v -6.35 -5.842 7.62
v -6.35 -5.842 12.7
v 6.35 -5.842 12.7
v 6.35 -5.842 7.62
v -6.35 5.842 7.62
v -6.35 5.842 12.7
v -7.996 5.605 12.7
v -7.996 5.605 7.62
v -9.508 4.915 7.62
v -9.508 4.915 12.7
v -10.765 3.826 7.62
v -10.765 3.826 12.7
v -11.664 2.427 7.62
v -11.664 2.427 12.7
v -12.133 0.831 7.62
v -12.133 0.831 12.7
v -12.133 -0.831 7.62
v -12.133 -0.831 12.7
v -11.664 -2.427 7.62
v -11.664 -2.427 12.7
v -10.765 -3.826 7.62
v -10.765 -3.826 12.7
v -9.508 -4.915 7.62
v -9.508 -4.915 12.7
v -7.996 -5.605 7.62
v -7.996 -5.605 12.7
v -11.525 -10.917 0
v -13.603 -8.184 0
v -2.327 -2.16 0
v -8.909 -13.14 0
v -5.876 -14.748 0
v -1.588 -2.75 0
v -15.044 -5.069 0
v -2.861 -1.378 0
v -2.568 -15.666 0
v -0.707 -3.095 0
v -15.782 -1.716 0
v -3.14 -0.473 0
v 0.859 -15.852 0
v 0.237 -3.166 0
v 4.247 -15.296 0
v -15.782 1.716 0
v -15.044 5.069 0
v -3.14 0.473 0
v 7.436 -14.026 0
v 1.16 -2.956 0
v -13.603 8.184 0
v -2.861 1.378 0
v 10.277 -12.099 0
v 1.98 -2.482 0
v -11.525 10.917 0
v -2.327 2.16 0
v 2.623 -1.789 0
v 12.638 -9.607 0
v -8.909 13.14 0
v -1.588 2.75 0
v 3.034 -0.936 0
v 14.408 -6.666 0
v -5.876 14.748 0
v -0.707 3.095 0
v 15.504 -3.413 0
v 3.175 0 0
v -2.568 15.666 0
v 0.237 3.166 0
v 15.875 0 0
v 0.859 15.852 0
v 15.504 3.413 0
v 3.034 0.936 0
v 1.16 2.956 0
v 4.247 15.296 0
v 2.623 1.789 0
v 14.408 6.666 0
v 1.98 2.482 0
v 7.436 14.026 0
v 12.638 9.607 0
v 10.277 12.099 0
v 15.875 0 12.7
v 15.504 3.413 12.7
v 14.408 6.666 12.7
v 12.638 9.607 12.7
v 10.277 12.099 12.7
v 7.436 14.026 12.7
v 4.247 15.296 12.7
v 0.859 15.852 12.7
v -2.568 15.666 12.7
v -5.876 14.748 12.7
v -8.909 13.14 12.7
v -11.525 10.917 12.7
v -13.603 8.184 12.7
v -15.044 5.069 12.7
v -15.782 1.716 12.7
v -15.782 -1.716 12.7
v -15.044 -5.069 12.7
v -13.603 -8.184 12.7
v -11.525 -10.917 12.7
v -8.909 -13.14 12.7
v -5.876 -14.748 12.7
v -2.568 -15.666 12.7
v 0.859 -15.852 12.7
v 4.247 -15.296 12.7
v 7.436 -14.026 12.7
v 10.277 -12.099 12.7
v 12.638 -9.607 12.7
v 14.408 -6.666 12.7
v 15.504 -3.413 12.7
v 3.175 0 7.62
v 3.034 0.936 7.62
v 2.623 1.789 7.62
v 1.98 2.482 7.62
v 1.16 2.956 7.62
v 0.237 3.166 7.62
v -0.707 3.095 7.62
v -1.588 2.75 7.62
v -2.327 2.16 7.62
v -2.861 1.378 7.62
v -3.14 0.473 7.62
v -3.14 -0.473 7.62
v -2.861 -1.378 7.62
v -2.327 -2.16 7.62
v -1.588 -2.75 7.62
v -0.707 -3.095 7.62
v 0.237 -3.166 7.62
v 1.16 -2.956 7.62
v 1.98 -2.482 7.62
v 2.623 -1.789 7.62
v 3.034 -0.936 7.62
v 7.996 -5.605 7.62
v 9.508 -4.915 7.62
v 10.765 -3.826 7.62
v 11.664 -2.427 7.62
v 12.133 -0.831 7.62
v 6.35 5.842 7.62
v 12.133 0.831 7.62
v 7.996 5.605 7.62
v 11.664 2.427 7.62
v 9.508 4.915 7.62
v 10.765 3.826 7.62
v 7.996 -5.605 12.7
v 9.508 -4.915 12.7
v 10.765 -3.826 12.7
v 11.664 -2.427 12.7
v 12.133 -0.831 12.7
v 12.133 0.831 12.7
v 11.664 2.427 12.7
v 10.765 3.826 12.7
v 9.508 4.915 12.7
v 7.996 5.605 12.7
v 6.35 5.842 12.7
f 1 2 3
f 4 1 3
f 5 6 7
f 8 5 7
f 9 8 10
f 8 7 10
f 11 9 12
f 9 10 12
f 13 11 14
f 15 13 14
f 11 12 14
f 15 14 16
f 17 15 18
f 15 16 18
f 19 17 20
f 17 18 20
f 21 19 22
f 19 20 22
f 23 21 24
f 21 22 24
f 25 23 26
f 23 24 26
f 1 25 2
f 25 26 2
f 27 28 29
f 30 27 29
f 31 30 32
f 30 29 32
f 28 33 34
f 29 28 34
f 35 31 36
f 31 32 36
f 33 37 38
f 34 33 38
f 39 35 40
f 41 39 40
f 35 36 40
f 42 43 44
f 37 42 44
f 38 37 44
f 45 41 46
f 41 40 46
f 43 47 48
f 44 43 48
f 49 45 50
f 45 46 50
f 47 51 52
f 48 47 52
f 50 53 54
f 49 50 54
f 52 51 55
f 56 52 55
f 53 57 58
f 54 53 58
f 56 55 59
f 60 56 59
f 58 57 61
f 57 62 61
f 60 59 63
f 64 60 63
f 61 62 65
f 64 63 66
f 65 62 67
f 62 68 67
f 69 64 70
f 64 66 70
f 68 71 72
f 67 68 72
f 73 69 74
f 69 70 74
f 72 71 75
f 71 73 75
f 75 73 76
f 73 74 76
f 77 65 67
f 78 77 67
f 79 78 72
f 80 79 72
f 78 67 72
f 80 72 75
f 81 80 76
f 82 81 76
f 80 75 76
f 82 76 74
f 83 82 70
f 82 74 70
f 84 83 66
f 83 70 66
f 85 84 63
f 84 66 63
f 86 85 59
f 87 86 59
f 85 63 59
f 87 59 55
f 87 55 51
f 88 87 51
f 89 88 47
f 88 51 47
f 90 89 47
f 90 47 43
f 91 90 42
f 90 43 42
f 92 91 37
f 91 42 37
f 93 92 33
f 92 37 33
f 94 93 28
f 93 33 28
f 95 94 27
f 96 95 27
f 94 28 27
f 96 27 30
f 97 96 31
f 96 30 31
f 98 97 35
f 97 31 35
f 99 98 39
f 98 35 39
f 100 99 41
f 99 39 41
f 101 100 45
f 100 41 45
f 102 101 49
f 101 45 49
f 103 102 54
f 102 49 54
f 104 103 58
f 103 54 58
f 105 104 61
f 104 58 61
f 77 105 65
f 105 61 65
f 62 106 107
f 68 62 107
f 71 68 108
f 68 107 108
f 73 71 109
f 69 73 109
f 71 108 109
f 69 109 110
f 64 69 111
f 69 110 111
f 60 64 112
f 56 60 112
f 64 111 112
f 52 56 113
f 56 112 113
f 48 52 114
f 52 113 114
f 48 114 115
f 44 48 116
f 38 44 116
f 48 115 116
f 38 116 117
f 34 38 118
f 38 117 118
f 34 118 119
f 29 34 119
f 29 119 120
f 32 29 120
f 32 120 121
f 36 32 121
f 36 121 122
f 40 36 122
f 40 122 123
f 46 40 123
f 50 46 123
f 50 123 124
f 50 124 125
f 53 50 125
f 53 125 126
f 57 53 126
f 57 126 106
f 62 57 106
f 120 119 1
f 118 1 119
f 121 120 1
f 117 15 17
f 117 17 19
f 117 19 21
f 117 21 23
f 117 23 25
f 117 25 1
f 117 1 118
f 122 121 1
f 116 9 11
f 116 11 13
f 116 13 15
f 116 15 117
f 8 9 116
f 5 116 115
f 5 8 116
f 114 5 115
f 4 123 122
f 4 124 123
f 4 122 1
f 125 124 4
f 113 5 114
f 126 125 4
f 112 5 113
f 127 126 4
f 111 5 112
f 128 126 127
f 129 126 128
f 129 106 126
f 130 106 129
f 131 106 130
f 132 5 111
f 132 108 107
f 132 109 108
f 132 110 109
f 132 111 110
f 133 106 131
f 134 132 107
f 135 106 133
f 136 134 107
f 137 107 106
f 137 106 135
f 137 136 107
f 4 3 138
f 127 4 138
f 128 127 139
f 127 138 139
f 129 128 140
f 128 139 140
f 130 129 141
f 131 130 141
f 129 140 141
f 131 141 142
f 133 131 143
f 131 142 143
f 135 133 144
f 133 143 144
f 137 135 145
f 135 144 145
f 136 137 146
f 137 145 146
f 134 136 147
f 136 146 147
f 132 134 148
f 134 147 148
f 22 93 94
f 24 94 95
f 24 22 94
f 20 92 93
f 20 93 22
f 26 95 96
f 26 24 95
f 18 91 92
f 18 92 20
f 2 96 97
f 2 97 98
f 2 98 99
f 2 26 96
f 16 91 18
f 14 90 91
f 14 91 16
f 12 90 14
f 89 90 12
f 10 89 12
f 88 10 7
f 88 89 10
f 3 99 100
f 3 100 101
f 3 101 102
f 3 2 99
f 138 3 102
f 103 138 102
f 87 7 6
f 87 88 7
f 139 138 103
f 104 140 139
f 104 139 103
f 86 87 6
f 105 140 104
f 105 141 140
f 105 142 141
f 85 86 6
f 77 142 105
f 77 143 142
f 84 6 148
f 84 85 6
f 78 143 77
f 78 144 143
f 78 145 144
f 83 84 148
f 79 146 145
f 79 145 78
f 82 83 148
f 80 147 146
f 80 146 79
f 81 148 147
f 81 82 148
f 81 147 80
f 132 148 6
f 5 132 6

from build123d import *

# Parameters (mm, degrees)
F0_R     = 15.875
F1_DEPTH = 12.7
F2_R     = 3.175
F3_DEPTH = 12.7
F5_DEPTH = 5.08


with BuildPart() as f1:
    # F0 (on Top) → F1 (new body)
    with BuildSketch(Plane.XY):
        Circle(F0_R)
    extrude(amount=F1_DEPTH)

    # F2 (on face) → F3 (cut, through all)
    with BuildSketch(Plane.XY.offset(12.7)):
        Circle(F2_R)
    extrude(amount=-F3_DEPTH, mode=Mode.SUBTRACT)

    # F4 (on face) → F5 (cut)
    with BuildSketch(Plane.XY.offset(12.7)):
        with BuildLine():
            Line((6.35, 5.842), (-6.35, 5.842))
            ThreePointArc((-6.35, 5.842), (-12.192, 0), (-6.35, -5.842))
            Line((-6.35, -5.842), (6.35, -5.842))
            ThreePointArc((6.35, -5.842), (12.192, 0), (6.35, 5.842))
        make_face()
    extrude(amount=-F5_DEPTH, mode=Mode.SUBTRACT)


solid = f1.part
